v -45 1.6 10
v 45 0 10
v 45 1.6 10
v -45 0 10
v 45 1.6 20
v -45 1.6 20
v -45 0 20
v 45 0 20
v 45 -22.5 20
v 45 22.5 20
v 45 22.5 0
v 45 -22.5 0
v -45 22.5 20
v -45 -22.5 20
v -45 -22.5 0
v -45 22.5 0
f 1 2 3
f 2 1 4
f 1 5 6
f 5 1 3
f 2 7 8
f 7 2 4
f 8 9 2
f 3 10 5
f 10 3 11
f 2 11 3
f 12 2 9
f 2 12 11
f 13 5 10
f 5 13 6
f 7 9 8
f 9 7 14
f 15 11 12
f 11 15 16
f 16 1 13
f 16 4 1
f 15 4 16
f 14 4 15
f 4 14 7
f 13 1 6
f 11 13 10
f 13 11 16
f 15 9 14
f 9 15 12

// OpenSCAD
// Slide drying rack - holds 10 microscope slides standing upright on their long edge
// Print orientation: base block on the bed (z = 0), slots open upward (+Z)

// ---------------- Parameters ----------------
block_len    = 90;    // base block length along X (mm)
block_wid    = 45;    // base block width along Y (mm)
block_h      = 20;    // base block height along Z (mm)

slot_count   = 10;    // number of slide slots
slot_len     = 77;    // slot length along X (mm)
slot_w       = 1.6;   // slot width along Y (mm)
slot_depth   = 10;    // slot depth from top face (mm)
slot_pitch   = 3.5;   // centre-to-centre slot spacing along Y (mm)

eps          = 0.5;   // overshoot of cutters past the top face (mm)

$fn = 64;

// ---------------- Model ----------------
difference() {
    // Base block, centred in X and Y, sitting on z = 0
    translate([-block_len / 2, -block_wid / 2, 0])
        cube([block_len, block_wid, block_h]);

    // Parallel slots, centred as a group in X and Y
    for (i = [0 : slot_count - 1]) {
        x = (i - (slot_count - 1) / 2) * slot_pitch;
        translate([x - slot_len / 2, 0, block_h - slot_depth])
            cube([slot_len, slot_w, slot_depth + eps]);
    }
}
